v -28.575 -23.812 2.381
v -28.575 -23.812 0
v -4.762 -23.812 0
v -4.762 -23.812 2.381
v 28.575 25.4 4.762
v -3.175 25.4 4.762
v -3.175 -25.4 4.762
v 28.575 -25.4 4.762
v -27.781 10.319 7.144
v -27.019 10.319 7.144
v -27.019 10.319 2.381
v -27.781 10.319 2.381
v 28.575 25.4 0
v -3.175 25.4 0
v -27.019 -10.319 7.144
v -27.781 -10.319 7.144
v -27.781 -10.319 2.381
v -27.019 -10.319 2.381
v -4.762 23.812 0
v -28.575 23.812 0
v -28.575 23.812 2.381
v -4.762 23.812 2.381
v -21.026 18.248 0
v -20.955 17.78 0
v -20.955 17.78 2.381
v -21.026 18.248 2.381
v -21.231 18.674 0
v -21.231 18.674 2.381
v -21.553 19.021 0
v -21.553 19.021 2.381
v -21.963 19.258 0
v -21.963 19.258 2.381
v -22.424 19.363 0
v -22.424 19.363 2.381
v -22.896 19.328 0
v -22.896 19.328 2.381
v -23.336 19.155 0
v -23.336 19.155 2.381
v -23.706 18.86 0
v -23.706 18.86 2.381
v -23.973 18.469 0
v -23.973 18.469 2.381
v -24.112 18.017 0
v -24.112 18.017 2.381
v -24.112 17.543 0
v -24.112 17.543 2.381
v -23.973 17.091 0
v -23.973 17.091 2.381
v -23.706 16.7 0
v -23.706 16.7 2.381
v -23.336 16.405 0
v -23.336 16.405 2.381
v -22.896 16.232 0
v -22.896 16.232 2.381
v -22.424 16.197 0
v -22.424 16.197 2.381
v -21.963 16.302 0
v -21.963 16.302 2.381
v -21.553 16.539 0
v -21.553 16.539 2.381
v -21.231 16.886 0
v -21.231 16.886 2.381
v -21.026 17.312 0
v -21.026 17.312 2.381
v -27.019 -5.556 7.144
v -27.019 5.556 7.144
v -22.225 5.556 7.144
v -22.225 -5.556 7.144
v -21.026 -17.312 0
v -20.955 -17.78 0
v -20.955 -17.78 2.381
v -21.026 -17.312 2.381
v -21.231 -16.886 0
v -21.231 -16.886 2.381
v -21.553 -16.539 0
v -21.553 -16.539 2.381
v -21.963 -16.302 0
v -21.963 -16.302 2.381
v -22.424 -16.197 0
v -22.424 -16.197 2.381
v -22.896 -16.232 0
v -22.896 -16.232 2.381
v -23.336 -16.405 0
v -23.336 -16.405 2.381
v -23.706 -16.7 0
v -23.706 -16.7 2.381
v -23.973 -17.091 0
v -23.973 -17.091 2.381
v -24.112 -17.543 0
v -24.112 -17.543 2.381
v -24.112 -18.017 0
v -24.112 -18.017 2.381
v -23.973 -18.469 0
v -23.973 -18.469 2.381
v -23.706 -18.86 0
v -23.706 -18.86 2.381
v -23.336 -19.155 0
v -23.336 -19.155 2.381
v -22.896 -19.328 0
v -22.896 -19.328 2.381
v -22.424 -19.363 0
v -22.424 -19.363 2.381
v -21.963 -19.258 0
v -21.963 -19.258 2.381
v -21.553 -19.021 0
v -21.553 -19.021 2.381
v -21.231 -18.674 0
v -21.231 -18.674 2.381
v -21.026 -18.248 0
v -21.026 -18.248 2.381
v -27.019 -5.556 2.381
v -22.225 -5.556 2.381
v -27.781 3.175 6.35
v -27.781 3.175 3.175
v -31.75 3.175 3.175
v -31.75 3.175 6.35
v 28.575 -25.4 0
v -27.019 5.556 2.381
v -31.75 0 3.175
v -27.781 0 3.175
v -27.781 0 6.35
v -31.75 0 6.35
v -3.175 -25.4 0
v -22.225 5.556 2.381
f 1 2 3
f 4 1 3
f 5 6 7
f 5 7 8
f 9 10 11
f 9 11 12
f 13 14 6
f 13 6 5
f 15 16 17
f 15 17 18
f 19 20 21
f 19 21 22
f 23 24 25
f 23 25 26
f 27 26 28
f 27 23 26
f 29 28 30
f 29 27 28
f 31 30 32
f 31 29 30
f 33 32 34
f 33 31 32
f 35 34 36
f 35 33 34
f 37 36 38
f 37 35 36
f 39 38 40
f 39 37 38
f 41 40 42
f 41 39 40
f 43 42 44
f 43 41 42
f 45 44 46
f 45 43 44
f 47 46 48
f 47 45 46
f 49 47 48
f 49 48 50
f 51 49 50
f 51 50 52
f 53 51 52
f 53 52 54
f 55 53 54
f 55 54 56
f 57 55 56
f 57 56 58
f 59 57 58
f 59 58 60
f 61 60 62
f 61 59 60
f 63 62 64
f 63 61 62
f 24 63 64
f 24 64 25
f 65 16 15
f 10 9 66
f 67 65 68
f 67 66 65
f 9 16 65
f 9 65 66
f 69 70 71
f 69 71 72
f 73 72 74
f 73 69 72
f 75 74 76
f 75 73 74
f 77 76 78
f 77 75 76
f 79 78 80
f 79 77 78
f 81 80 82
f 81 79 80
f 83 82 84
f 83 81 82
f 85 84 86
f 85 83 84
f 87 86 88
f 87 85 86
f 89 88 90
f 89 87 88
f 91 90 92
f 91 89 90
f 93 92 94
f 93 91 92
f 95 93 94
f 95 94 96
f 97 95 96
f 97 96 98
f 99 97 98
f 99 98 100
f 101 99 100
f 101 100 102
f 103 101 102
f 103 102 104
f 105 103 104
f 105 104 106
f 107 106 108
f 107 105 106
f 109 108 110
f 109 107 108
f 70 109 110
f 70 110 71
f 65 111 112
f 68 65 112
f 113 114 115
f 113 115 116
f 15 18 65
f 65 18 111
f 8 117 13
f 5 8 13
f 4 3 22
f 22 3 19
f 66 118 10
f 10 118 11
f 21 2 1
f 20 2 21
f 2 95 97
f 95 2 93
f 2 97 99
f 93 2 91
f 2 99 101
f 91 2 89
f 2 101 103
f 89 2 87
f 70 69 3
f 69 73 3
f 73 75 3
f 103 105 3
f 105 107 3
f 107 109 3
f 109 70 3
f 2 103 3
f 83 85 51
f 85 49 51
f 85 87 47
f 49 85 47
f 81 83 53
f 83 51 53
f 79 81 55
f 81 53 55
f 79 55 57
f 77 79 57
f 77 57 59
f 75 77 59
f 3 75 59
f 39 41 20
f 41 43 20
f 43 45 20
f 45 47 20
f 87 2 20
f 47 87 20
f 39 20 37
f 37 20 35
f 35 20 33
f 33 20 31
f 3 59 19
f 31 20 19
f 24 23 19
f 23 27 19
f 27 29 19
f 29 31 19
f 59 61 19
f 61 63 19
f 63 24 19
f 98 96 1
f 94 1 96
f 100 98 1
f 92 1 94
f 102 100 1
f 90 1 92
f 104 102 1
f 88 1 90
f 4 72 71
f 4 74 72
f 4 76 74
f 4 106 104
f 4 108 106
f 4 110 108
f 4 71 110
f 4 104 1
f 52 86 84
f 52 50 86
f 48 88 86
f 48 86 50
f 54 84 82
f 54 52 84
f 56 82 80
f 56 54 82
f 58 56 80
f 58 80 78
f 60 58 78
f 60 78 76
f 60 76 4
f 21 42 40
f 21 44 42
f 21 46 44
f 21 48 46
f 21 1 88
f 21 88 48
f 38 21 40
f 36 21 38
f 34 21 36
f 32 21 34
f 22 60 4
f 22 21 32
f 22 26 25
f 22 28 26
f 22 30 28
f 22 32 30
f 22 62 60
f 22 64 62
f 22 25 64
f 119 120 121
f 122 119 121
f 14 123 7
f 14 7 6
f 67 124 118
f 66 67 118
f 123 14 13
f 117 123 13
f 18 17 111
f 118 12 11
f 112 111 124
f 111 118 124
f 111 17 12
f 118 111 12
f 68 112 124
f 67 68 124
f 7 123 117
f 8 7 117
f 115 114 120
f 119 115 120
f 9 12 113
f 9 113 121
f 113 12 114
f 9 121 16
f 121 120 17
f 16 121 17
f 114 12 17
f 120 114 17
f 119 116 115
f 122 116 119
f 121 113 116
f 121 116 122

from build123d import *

# Parameters (mm, degrees)
F0_W     = 31.75
F0_H     = 50.8
F1_DEPTH = 4.7625
F2_W     = 23.8125
F2_H     = 47.625
F2_R     = 1.5875
F3_DEPTH = 2.38125
F5_DEPTH = 4.7625
F6_W     = 3.175
F6_H     = 3.175
F7_DEPTH = 3.96875


# Not quite as in the source:
# - a length typed as a fraction of an inch, garbled in the dataset ("3 / 203.2 mm" for 3/8 in), is restored


with BuildPart() as f1:
    # F0 (on Top) → F1 (new body)
    with BuildSketch(Plane.XY):
        with Locations((12.7, 0)):
            Rectangle(F0_W, F0_H)
    extrude(amount=F1_DEPTH)


with BuildPart() as f3:
    # F2 (on Top) → F3 (new body)
    with BuildSketch(Plane.XY):
        with Locations((-16.66875, 0)):
            Rectangle(F2_W, F2_H)
        with Locations((-22.5425, -17.78)):
            Circle(F2_R, mode=Mode.SUBTRACT)
        with Locations((-22.5425, 17.78)):
            Circle(F2_R, mode=Mode.SUBTRACT)
    extrude(amount=F3_DEPTH)


with BuildPart() as f5:
    # F4 (on face) → F5 (new body)
    with BuildSketch(Plane.XY.offset(2.38125)):
        Polygon((-27.01925, 10.31875), (-27.78125, 10.31875), (-27.78125, -10.31875), (-27.01925, -10.31875), (-27.01925, -5.55625), (-22.225, -5.55625), (-22.225, 5.55625), (-27.01925, 5.55625), align=None)
    extrude(amount=F5_DEPTH)

    # F6 (on face) → F7 (join)
    with BuildSketch(Plane(origin=(-27.78125, 0, 0), x_dir=(0, -1, 0), z_dir=(-1, 0, 0))):
        with Locations((-1.5875, 4.7625)):
            Rectangle(F6_W, F6_H)
    extrude(amount=F7_DEPTH)


solid = Compound([f1.part, f3.part, f5.part])
